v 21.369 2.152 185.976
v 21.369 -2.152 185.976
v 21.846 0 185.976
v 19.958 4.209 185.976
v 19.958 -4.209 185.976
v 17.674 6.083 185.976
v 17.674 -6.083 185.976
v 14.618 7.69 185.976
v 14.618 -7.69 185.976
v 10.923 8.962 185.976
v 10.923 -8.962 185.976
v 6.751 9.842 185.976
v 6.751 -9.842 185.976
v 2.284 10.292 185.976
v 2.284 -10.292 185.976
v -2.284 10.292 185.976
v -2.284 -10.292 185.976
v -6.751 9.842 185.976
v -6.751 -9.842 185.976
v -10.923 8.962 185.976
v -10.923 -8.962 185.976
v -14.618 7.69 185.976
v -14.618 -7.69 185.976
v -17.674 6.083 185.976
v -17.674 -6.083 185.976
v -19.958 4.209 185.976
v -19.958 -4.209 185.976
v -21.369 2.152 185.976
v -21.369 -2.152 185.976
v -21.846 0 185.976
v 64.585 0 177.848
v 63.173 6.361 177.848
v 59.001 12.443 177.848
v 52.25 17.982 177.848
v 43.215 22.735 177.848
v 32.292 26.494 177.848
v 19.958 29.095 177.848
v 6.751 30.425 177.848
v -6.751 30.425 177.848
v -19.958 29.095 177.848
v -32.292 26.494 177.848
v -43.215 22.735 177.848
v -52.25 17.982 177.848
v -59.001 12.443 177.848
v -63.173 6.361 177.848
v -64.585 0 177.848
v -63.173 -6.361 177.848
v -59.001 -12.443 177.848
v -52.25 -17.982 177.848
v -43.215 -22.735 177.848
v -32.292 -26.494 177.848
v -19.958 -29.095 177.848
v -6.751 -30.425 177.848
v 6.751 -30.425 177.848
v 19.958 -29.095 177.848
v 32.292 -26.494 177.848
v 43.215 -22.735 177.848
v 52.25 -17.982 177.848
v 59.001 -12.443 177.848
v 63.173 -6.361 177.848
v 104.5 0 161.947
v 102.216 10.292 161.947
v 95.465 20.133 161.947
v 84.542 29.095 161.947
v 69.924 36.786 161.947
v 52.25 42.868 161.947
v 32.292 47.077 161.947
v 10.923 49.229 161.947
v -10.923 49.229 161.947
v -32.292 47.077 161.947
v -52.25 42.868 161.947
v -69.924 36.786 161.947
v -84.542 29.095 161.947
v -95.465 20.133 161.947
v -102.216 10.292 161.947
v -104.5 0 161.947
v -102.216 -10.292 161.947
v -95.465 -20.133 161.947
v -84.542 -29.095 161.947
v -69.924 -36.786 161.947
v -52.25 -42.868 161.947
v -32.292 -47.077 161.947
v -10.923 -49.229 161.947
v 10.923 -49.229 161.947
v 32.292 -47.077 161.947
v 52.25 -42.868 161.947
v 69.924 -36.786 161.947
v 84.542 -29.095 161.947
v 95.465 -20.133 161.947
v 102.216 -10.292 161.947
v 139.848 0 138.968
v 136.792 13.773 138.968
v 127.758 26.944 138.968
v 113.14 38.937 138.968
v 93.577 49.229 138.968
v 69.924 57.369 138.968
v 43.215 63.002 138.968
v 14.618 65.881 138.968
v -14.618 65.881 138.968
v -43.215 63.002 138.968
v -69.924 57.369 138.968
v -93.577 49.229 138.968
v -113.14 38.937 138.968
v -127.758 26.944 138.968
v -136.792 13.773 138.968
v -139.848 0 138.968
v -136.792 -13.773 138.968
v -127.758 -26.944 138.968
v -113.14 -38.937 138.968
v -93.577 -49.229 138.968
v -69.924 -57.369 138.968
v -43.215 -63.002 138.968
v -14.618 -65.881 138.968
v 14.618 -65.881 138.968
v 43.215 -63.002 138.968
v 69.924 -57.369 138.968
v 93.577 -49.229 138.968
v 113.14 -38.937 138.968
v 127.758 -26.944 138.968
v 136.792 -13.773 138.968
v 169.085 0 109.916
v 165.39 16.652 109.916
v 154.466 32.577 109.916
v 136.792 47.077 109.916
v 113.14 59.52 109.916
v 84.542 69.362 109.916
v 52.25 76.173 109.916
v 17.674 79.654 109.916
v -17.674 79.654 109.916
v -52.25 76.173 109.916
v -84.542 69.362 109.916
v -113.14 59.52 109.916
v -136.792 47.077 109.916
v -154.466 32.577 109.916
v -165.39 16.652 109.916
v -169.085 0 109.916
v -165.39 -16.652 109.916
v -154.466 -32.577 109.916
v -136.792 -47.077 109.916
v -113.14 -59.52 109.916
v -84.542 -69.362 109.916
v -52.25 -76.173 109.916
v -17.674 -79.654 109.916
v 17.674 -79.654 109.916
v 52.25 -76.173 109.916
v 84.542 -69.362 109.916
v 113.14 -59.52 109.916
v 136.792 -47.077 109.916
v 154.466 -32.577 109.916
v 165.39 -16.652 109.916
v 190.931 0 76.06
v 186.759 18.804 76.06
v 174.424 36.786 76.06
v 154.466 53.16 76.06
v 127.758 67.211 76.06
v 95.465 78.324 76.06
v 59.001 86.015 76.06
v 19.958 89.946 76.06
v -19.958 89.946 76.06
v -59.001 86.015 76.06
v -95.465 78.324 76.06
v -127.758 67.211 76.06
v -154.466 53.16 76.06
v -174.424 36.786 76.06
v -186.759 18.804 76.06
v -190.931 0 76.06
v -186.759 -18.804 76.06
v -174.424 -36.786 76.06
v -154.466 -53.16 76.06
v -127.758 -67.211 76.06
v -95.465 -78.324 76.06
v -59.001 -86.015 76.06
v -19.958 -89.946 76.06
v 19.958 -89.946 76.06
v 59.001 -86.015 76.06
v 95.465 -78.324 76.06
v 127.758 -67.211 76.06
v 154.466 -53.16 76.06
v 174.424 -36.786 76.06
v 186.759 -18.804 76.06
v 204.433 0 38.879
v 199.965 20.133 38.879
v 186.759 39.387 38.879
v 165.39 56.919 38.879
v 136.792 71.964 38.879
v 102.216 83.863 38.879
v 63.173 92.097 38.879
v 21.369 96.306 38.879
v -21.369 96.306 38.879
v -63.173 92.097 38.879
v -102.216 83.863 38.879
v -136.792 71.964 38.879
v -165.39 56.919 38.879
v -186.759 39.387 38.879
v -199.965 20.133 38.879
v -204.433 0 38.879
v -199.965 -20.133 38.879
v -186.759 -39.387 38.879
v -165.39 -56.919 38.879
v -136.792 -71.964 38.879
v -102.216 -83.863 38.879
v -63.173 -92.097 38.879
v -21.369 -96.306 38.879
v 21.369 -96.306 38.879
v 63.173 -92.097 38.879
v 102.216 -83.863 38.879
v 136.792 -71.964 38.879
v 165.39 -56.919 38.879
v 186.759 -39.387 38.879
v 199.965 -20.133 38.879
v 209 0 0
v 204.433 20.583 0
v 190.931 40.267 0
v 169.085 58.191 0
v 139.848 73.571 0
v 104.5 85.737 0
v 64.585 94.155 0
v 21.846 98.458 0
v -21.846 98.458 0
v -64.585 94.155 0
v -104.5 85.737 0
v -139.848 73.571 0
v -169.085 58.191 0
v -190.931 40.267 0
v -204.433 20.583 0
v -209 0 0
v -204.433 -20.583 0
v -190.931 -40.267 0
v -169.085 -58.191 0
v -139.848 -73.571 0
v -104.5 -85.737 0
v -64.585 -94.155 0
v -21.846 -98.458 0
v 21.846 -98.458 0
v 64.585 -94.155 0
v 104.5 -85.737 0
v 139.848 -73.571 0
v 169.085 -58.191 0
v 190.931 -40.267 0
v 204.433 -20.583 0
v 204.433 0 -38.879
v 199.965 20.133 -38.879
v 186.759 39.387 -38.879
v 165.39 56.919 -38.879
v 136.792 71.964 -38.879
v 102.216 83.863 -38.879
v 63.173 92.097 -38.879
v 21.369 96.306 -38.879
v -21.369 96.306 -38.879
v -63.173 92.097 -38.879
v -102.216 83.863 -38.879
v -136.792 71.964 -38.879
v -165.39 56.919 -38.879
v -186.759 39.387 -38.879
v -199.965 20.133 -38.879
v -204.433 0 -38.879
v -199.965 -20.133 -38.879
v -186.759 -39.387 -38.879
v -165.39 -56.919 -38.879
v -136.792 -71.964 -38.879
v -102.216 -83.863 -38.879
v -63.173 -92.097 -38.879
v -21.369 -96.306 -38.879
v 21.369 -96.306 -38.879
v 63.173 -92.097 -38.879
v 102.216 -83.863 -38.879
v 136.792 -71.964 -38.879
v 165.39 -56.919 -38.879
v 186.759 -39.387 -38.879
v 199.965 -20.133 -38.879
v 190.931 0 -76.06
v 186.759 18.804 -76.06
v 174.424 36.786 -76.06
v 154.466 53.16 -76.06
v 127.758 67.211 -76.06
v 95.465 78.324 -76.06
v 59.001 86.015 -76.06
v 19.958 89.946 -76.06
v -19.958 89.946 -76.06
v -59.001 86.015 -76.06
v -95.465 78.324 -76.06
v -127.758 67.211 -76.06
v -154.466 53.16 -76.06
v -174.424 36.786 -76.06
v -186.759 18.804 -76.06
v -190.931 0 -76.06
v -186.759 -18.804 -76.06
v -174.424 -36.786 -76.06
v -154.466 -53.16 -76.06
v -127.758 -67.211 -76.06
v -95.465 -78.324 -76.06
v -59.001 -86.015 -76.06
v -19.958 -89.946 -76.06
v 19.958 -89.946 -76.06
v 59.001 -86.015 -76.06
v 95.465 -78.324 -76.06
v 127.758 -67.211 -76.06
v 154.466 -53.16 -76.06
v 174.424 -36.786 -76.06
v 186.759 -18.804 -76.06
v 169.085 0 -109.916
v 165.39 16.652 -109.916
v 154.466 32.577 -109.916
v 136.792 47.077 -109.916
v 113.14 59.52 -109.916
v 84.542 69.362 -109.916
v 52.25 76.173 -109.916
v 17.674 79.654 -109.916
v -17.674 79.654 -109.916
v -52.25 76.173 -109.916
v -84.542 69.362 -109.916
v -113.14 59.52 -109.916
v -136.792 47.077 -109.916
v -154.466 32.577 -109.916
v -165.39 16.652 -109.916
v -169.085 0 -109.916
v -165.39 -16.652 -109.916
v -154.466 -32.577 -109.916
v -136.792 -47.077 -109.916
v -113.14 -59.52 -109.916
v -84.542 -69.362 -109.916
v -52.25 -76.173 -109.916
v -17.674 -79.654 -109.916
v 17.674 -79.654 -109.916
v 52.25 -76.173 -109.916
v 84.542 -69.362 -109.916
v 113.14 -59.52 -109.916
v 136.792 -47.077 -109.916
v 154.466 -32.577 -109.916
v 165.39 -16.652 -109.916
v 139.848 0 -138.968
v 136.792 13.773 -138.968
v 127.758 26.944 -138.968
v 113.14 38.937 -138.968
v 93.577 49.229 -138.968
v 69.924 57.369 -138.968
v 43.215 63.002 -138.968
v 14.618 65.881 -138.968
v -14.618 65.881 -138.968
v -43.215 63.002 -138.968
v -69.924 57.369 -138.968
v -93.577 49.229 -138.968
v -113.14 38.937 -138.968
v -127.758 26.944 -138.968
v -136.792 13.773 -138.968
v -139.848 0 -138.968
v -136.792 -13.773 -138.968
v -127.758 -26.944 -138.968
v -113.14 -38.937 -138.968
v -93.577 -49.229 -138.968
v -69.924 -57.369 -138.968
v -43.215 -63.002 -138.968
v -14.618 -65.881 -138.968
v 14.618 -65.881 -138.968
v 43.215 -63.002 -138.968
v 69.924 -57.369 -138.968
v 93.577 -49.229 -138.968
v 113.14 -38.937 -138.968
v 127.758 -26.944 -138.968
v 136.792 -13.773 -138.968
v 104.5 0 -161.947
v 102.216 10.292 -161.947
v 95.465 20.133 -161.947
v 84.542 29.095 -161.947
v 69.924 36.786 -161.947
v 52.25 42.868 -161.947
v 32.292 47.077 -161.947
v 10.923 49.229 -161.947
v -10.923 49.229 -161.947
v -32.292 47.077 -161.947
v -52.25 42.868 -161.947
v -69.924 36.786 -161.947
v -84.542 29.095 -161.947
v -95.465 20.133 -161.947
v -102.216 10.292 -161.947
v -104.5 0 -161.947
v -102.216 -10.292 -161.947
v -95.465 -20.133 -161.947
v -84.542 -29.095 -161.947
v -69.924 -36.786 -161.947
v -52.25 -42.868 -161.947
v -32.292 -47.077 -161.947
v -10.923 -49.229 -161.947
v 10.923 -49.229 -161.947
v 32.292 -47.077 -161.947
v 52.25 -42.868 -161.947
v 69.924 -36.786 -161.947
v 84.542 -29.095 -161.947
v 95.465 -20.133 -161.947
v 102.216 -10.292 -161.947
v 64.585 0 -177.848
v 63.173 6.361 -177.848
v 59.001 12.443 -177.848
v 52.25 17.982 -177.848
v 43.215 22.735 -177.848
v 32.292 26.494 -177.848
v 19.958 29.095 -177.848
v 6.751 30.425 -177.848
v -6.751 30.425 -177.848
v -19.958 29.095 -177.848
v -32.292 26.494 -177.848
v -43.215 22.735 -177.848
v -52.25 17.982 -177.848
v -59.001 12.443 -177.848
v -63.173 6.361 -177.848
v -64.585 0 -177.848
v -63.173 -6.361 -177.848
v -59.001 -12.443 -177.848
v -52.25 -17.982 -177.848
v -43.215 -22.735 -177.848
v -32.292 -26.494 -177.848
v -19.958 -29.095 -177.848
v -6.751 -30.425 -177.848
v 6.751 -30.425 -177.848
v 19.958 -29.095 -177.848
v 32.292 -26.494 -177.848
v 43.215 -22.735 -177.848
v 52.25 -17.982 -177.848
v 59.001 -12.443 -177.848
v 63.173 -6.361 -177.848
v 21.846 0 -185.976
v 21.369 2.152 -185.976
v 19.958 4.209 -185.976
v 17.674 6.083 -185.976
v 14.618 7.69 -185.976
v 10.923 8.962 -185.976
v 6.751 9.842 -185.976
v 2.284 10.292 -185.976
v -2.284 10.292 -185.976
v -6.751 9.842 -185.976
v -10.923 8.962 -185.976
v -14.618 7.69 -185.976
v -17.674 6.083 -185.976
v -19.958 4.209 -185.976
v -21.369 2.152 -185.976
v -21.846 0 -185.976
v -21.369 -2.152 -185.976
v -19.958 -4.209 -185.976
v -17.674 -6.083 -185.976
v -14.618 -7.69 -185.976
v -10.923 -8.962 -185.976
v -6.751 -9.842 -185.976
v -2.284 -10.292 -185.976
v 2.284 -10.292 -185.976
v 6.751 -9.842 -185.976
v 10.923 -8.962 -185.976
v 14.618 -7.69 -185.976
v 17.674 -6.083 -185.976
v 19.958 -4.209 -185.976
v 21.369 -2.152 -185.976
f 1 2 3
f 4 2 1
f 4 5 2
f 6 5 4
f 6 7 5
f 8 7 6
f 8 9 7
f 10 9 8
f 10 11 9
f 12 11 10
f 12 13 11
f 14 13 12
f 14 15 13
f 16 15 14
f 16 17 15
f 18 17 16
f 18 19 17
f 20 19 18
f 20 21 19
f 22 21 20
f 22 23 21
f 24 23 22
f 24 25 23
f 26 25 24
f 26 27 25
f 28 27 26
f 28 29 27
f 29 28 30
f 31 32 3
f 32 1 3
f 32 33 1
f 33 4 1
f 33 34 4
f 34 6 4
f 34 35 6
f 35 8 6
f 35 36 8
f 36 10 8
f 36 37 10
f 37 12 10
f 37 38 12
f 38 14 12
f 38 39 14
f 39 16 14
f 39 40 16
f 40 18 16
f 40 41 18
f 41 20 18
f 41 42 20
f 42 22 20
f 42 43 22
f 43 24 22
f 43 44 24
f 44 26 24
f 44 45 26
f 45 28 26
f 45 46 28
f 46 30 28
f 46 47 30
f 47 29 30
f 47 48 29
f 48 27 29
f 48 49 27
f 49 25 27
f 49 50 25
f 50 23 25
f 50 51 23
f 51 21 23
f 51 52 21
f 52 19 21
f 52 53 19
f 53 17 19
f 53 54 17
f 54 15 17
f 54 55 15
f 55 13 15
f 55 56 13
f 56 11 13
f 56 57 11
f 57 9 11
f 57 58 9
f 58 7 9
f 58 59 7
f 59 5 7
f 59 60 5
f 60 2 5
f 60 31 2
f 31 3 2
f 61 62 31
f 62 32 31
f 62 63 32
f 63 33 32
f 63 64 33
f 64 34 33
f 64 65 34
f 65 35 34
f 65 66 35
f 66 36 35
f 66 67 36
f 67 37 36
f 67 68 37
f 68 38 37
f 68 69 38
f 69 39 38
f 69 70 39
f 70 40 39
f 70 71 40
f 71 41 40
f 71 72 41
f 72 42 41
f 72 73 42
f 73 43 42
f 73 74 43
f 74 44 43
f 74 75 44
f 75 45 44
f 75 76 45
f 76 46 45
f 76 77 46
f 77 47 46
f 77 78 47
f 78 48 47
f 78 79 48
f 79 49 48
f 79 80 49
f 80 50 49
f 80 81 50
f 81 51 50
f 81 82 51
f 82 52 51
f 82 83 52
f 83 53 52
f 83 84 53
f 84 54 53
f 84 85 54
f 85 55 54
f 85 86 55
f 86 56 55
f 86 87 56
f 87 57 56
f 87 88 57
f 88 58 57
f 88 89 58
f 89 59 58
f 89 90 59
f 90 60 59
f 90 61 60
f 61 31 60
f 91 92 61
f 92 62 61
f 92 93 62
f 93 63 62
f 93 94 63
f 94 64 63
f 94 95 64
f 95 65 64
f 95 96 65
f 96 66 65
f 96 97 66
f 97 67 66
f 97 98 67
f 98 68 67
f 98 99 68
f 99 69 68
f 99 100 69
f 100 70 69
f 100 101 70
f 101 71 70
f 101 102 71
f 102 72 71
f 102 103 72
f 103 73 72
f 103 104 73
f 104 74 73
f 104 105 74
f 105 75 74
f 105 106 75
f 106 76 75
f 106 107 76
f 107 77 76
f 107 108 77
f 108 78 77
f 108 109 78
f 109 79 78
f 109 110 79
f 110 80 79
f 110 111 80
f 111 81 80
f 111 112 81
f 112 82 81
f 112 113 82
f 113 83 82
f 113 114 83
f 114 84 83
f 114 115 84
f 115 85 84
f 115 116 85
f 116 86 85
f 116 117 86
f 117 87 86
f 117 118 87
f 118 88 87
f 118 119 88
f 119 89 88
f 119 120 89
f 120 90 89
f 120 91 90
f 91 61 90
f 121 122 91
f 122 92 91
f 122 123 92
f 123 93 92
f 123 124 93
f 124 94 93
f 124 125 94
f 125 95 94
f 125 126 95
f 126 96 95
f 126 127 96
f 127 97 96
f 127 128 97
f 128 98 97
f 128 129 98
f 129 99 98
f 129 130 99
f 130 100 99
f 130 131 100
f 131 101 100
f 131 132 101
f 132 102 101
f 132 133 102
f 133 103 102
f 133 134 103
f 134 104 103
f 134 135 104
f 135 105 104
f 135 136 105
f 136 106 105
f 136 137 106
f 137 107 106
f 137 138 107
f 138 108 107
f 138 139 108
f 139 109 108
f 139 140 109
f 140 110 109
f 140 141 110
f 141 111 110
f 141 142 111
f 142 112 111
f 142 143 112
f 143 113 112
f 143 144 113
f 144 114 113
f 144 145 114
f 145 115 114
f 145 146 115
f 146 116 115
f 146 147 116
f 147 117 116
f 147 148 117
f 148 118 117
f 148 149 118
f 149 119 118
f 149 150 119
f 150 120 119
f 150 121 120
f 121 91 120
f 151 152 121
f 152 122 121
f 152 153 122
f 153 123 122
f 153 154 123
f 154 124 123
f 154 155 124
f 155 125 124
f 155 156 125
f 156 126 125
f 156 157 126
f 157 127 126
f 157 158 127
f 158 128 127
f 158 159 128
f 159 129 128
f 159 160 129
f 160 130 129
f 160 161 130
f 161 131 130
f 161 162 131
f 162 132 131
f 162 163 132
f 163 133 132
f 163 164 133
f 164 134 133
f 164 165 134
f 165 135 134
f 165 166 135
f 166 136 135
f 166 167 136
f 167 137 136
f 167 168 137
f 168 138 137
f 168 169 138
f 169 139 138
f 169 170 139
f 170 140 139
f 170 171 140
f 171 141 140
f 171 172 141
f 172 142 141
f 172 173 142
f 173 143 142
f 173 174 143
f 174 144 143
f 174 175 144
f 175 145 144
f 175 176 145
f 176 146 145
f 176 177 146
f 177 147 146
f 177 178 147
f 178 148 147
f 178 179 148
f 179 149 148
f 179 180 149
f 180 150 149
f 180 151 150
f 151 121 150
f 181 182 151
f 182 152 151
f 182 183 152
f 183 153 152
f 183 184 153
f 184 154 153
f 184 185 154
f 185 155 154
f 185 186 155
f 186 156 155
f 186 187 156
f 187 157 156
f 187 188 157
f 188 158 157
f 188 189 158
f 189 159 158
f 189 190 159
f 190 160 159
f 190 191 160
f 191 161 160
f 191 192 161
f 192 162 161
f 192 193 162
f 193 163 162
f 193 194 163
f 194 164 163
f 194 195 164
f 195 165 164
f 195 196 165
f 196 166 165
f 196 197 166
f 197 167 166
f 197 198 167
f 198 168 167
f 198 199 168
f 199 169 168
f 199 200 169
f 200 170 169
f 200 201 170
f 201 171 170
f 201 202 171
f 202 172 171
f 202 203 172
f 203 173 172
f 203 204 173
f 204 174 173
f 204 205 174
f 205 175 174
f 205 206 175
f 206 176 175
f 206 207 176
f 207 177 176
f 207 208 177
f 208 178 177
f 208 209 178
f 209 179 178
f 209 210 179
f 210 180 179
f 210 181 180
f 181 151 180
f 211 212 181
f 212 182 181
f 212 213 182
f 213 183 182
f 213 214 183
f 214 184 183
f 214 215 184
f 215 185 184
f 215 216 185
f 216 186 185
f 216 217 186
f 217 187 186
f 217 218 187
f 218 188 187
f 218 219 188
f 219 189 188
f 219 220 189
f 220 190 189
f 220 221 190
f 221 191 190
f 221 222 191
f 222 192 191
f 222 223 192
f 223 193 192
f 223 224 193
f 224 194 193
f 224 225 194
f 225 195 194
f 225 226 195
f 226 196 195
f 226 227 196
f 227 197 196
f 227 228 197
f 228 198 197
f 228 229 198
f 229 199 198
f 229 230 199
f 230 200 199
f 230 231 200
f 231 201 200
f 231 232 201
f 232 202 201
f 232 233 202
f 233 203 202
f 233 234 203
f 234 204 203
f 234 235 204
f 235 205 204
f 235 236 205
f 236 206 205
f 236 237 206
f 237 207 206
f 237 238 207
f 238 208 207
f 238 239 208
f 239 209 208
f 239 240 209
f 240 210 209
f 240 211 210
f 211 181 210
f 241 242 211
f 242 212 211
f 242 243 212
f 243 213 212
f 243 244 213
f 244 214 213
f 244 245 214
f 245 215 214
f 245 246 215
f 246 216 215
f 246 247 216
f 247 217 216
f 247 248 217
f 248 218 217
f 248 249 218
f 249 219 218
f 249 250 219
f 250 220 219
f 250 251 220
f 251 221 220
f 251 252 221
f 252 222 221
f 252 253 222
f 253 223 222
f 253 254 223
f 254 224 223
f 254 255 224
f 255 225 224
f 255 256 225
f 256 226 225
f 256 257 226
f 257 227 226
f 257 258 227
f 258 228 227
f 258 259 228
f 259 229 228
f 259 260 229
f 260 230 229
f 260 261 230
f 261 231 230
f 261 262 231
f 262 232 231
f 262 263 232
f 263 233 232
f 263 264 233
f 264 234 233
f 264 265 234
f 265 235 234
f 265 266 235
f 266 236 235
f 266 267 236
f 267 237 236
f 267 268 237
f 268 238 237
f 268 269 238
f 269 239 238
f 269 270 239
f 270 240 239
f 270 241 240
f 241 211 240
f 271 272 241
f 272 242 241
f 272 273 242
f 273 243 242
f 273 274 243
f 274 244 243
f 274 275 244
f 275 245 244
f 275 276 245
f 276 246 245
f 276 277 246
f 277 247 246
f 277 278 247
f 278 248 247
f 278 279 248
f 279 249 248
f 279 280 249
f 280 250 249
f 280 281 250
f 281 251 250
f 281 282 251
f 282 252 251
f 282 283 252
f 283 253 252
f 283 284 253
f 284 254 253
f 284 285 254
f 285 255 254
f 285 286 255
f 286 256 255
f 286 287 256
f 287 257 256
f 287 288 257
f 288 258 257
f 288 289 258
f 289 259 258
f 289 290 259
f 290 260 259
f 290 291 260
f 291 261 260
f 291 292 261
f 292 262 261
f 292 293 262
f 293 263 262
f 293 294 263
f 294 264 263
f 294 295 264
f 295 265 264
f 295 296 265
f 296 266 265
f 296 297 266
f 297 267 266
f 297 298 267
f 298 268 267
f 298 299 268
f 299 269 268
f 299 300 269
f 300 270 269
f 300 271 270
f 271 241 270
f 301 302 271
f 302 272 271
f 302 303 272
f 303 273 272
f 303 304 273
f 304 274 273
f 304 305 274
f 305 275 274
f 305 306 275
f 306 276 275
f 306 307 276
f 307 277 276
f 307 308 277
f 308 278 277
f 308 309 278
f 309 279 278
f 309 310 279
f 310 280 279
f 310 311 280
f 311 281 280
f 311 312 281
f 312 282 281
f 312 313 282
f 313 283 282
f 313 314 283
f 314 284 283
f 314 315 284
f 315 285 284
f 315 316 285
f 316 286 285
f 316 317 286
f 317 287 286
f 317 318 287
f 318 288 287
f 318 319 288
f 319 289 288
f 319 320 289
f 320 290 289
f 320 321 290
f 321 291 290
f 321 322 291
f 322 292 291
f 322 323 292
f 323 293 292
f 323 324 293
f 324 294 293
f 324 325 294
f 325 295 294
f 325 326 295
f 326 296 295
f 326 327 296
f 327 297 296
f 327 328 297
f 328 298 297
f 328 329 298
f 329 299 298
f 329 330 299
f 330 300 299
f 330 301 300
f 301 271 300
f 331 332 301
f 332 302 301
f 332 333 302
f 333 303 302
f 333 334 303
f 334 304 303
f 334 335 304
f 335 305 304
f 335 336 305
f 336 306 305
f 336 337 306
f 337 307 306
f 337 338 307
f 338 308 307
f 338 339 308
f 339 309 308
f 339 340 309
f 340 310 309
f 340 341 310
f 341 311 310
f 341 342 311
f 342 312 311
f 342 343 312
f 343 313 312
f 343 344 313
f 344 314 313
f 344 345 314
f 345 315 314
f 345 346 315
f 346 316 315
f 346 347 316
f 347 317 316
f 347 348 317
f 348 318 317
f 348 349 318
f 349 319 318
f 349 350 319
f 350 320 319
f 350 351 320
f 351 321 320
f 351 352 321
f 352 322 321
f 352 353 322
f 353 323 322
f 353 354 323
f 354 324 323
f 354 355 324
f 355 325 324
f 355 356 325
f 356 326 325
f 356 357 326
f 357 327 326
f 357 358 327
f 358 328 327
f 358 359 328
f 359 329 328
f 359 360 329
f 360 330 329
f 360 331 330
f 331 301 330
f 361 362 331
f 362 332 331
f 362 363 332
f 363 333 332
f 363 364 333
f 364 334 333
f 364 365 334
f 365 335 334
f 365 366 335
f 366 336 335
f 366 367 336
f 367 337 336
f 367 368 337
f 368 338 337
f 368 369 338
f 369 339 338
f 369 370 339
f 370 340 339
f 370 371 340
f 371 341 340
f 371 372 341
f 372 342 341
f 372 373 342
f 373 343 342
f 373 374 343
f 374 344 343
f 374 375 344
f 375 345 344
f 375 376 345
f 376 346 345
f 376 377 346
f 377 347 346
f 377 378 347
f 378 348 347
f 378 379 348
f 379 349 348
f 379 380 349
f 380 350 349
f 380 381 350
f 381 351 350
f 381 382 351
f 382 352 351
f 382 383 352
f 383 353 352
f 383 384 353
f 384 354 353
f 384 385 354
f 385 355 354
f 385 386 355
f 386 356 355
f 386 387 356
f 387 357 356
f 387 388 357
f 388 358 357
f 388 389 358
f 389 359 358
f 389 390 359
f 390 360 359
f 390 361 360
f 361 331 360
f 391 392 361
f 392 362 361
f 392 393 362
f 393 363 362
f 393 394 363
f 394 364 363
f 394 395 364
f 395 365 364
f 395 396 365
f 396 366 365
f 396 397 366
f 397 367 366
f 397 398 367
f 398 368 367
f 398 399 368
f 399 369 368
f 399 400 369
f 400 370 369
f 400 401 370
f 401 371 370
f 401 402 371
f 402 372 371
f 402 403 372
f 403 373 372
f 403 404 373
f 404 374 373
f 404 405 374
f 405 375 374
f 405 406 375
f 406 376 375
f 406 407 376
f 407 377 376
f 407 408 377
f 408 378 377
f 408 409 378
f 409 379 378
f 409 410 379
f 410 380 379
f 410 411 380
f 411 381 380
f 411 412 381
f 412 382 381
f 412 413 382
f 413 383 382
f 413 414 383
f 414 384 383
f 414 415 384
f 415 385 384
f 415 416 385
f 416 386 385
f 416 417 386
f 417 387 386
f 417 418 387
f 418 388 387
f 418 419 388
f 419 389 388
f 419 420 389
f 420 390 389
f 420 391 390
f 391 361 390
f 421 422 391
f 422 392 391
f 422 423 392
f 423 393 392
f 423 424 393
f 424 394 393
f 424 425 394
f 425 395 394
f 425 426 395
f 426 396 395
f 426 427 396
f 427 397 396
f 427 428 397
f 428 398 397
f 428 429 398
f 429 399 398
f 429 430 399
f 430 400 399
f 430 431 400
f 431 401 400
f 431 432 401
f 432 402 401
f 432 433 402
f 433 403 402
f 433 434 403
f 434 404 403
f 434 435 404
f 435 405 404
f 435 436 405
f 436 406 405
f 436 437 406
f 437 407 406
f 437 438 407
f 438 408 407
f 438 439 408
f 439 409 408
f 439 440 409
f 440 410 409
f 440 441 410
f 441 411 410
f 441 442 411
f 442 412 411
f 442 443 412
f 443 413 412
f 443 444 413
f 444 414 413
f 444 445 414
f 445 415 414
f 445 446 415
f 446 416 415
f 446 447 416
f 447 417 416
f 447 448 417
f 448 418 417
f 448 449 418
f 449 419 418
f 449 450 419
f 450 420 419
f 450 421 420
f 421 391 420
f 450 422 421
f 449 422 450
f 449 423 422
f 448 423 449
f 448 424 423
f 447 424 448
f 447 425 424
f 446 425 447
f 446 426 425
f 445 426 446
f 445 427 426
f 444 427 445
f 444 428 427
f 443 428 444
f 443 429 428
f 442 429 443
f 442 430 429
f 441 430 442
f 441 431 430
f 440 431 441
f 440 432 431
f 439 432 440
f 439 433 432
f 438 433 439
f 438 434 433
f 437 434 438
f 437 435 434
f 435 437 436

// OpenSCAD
// Generated by SolidPython 1.0.1 on 2020-07-29 00:46:54


scale(v = [19, 9, 17]) {
	sphere(r = 11);
}
/***********************************************
*********      SolidPython code:      **********
************************************************
 
# import packages: SolidPython
from solid import *
from solid.utils import *
from itertools import chain, combinations, permutations


class Resize:

    def __init__(self, scad_file):
        self.scad_file = scad_file
        #self.scad_file = import_scad(scad_file)
        # cone/cylinder param:
        self.r1 = 0
        self.r2 = 0
        self.h = 0
        # rectangular prism param:
        self.w = 0
        self.l = 0
        # ellipse param:
        self.r = 0

    # import OpenScad code (file name corresponds to shape)


    # classify shape + parameters
    def assign(self, param1, param2, param3):
        if self.scad_file == 'cone.scad':
            self.r1 = param1
            self.r2 = param2
            self.h = param3
        elif self.scad_file == 'cylinder.scad':
            self.r1 = param1
            self.r2 = param2
            self.h = param3
        elif self.scad_file == 'rectangularPrism.scad':
            self.h = param1
            self.l = param2
            self.w = param3
        else:
            self.r = param1
            self.h = param2

    # resize parameters
    def iterate(self):
        x = range(3, 20, 2)
        i = 1
        if self.scad_file == 'cone.scad':
            tempList = list(permutations(x, 2))
            for temp in tempList:
                param1 = temp[0]
                param2 = temp[1]
                filepath = 'produced_scad_files/' + 'cone' + str(param1) + '_' + str(param2) + '_' + '.scad'
                scad_render_to_file(cylinder(h=param1, r1=param2, r2=0), filepath)

        elif self.scad_file == 'cylinder.scad':
            tempList = list(permutations(x, 3))
            for temp in tempList:
                param1 = temp[0]
                param2 = temp[1]
                filepath = 'produced_scad_files/' + 'cylinder' + str(param1) + '_' + str(param2) + '_' + '.scad'
                scad_render_to_file(cylinder(h=param1, r1=param2, r2=param2), filepath)

        elif self.scad_file == 'rectangularPrism.scad':
            tempList = list(permutations(x, 3))
            for temp in tempList:
                param1 = temp[0]
                param2 = temp[1]
                param3 = temp[2]
                filepath = 'produced_scad_files/' + 'rectangularPrism' + str(param1) + '_' + str(param2) + '_' + str(
                    param3) + '.scad'
                scad_render_to_file(cube(size=(param1, param2, param3)), filepath)

        elif self.scad_file == 'ellipse.scad':
            tempList = list(permutations(x, 4))
            for temp in tempList:
                param1 = temp[0]
                param2 = temp[1]
                param3 = temp[2]
                param4 = temp[3]
                filepath = 'produced_scad_files/' + 'ellipse' + str(param1) + '_' + str(param2) + '_' + str(param3) + '_' + str(param4) + '.scad'
                scad_render_to_file(scale([param1, param2, param3])(sphere(r=param4)), filepath)

    def render_to_scadfile(self):
        scad_render_to_file(scad, 'example.scad') 
 
************************************************/
